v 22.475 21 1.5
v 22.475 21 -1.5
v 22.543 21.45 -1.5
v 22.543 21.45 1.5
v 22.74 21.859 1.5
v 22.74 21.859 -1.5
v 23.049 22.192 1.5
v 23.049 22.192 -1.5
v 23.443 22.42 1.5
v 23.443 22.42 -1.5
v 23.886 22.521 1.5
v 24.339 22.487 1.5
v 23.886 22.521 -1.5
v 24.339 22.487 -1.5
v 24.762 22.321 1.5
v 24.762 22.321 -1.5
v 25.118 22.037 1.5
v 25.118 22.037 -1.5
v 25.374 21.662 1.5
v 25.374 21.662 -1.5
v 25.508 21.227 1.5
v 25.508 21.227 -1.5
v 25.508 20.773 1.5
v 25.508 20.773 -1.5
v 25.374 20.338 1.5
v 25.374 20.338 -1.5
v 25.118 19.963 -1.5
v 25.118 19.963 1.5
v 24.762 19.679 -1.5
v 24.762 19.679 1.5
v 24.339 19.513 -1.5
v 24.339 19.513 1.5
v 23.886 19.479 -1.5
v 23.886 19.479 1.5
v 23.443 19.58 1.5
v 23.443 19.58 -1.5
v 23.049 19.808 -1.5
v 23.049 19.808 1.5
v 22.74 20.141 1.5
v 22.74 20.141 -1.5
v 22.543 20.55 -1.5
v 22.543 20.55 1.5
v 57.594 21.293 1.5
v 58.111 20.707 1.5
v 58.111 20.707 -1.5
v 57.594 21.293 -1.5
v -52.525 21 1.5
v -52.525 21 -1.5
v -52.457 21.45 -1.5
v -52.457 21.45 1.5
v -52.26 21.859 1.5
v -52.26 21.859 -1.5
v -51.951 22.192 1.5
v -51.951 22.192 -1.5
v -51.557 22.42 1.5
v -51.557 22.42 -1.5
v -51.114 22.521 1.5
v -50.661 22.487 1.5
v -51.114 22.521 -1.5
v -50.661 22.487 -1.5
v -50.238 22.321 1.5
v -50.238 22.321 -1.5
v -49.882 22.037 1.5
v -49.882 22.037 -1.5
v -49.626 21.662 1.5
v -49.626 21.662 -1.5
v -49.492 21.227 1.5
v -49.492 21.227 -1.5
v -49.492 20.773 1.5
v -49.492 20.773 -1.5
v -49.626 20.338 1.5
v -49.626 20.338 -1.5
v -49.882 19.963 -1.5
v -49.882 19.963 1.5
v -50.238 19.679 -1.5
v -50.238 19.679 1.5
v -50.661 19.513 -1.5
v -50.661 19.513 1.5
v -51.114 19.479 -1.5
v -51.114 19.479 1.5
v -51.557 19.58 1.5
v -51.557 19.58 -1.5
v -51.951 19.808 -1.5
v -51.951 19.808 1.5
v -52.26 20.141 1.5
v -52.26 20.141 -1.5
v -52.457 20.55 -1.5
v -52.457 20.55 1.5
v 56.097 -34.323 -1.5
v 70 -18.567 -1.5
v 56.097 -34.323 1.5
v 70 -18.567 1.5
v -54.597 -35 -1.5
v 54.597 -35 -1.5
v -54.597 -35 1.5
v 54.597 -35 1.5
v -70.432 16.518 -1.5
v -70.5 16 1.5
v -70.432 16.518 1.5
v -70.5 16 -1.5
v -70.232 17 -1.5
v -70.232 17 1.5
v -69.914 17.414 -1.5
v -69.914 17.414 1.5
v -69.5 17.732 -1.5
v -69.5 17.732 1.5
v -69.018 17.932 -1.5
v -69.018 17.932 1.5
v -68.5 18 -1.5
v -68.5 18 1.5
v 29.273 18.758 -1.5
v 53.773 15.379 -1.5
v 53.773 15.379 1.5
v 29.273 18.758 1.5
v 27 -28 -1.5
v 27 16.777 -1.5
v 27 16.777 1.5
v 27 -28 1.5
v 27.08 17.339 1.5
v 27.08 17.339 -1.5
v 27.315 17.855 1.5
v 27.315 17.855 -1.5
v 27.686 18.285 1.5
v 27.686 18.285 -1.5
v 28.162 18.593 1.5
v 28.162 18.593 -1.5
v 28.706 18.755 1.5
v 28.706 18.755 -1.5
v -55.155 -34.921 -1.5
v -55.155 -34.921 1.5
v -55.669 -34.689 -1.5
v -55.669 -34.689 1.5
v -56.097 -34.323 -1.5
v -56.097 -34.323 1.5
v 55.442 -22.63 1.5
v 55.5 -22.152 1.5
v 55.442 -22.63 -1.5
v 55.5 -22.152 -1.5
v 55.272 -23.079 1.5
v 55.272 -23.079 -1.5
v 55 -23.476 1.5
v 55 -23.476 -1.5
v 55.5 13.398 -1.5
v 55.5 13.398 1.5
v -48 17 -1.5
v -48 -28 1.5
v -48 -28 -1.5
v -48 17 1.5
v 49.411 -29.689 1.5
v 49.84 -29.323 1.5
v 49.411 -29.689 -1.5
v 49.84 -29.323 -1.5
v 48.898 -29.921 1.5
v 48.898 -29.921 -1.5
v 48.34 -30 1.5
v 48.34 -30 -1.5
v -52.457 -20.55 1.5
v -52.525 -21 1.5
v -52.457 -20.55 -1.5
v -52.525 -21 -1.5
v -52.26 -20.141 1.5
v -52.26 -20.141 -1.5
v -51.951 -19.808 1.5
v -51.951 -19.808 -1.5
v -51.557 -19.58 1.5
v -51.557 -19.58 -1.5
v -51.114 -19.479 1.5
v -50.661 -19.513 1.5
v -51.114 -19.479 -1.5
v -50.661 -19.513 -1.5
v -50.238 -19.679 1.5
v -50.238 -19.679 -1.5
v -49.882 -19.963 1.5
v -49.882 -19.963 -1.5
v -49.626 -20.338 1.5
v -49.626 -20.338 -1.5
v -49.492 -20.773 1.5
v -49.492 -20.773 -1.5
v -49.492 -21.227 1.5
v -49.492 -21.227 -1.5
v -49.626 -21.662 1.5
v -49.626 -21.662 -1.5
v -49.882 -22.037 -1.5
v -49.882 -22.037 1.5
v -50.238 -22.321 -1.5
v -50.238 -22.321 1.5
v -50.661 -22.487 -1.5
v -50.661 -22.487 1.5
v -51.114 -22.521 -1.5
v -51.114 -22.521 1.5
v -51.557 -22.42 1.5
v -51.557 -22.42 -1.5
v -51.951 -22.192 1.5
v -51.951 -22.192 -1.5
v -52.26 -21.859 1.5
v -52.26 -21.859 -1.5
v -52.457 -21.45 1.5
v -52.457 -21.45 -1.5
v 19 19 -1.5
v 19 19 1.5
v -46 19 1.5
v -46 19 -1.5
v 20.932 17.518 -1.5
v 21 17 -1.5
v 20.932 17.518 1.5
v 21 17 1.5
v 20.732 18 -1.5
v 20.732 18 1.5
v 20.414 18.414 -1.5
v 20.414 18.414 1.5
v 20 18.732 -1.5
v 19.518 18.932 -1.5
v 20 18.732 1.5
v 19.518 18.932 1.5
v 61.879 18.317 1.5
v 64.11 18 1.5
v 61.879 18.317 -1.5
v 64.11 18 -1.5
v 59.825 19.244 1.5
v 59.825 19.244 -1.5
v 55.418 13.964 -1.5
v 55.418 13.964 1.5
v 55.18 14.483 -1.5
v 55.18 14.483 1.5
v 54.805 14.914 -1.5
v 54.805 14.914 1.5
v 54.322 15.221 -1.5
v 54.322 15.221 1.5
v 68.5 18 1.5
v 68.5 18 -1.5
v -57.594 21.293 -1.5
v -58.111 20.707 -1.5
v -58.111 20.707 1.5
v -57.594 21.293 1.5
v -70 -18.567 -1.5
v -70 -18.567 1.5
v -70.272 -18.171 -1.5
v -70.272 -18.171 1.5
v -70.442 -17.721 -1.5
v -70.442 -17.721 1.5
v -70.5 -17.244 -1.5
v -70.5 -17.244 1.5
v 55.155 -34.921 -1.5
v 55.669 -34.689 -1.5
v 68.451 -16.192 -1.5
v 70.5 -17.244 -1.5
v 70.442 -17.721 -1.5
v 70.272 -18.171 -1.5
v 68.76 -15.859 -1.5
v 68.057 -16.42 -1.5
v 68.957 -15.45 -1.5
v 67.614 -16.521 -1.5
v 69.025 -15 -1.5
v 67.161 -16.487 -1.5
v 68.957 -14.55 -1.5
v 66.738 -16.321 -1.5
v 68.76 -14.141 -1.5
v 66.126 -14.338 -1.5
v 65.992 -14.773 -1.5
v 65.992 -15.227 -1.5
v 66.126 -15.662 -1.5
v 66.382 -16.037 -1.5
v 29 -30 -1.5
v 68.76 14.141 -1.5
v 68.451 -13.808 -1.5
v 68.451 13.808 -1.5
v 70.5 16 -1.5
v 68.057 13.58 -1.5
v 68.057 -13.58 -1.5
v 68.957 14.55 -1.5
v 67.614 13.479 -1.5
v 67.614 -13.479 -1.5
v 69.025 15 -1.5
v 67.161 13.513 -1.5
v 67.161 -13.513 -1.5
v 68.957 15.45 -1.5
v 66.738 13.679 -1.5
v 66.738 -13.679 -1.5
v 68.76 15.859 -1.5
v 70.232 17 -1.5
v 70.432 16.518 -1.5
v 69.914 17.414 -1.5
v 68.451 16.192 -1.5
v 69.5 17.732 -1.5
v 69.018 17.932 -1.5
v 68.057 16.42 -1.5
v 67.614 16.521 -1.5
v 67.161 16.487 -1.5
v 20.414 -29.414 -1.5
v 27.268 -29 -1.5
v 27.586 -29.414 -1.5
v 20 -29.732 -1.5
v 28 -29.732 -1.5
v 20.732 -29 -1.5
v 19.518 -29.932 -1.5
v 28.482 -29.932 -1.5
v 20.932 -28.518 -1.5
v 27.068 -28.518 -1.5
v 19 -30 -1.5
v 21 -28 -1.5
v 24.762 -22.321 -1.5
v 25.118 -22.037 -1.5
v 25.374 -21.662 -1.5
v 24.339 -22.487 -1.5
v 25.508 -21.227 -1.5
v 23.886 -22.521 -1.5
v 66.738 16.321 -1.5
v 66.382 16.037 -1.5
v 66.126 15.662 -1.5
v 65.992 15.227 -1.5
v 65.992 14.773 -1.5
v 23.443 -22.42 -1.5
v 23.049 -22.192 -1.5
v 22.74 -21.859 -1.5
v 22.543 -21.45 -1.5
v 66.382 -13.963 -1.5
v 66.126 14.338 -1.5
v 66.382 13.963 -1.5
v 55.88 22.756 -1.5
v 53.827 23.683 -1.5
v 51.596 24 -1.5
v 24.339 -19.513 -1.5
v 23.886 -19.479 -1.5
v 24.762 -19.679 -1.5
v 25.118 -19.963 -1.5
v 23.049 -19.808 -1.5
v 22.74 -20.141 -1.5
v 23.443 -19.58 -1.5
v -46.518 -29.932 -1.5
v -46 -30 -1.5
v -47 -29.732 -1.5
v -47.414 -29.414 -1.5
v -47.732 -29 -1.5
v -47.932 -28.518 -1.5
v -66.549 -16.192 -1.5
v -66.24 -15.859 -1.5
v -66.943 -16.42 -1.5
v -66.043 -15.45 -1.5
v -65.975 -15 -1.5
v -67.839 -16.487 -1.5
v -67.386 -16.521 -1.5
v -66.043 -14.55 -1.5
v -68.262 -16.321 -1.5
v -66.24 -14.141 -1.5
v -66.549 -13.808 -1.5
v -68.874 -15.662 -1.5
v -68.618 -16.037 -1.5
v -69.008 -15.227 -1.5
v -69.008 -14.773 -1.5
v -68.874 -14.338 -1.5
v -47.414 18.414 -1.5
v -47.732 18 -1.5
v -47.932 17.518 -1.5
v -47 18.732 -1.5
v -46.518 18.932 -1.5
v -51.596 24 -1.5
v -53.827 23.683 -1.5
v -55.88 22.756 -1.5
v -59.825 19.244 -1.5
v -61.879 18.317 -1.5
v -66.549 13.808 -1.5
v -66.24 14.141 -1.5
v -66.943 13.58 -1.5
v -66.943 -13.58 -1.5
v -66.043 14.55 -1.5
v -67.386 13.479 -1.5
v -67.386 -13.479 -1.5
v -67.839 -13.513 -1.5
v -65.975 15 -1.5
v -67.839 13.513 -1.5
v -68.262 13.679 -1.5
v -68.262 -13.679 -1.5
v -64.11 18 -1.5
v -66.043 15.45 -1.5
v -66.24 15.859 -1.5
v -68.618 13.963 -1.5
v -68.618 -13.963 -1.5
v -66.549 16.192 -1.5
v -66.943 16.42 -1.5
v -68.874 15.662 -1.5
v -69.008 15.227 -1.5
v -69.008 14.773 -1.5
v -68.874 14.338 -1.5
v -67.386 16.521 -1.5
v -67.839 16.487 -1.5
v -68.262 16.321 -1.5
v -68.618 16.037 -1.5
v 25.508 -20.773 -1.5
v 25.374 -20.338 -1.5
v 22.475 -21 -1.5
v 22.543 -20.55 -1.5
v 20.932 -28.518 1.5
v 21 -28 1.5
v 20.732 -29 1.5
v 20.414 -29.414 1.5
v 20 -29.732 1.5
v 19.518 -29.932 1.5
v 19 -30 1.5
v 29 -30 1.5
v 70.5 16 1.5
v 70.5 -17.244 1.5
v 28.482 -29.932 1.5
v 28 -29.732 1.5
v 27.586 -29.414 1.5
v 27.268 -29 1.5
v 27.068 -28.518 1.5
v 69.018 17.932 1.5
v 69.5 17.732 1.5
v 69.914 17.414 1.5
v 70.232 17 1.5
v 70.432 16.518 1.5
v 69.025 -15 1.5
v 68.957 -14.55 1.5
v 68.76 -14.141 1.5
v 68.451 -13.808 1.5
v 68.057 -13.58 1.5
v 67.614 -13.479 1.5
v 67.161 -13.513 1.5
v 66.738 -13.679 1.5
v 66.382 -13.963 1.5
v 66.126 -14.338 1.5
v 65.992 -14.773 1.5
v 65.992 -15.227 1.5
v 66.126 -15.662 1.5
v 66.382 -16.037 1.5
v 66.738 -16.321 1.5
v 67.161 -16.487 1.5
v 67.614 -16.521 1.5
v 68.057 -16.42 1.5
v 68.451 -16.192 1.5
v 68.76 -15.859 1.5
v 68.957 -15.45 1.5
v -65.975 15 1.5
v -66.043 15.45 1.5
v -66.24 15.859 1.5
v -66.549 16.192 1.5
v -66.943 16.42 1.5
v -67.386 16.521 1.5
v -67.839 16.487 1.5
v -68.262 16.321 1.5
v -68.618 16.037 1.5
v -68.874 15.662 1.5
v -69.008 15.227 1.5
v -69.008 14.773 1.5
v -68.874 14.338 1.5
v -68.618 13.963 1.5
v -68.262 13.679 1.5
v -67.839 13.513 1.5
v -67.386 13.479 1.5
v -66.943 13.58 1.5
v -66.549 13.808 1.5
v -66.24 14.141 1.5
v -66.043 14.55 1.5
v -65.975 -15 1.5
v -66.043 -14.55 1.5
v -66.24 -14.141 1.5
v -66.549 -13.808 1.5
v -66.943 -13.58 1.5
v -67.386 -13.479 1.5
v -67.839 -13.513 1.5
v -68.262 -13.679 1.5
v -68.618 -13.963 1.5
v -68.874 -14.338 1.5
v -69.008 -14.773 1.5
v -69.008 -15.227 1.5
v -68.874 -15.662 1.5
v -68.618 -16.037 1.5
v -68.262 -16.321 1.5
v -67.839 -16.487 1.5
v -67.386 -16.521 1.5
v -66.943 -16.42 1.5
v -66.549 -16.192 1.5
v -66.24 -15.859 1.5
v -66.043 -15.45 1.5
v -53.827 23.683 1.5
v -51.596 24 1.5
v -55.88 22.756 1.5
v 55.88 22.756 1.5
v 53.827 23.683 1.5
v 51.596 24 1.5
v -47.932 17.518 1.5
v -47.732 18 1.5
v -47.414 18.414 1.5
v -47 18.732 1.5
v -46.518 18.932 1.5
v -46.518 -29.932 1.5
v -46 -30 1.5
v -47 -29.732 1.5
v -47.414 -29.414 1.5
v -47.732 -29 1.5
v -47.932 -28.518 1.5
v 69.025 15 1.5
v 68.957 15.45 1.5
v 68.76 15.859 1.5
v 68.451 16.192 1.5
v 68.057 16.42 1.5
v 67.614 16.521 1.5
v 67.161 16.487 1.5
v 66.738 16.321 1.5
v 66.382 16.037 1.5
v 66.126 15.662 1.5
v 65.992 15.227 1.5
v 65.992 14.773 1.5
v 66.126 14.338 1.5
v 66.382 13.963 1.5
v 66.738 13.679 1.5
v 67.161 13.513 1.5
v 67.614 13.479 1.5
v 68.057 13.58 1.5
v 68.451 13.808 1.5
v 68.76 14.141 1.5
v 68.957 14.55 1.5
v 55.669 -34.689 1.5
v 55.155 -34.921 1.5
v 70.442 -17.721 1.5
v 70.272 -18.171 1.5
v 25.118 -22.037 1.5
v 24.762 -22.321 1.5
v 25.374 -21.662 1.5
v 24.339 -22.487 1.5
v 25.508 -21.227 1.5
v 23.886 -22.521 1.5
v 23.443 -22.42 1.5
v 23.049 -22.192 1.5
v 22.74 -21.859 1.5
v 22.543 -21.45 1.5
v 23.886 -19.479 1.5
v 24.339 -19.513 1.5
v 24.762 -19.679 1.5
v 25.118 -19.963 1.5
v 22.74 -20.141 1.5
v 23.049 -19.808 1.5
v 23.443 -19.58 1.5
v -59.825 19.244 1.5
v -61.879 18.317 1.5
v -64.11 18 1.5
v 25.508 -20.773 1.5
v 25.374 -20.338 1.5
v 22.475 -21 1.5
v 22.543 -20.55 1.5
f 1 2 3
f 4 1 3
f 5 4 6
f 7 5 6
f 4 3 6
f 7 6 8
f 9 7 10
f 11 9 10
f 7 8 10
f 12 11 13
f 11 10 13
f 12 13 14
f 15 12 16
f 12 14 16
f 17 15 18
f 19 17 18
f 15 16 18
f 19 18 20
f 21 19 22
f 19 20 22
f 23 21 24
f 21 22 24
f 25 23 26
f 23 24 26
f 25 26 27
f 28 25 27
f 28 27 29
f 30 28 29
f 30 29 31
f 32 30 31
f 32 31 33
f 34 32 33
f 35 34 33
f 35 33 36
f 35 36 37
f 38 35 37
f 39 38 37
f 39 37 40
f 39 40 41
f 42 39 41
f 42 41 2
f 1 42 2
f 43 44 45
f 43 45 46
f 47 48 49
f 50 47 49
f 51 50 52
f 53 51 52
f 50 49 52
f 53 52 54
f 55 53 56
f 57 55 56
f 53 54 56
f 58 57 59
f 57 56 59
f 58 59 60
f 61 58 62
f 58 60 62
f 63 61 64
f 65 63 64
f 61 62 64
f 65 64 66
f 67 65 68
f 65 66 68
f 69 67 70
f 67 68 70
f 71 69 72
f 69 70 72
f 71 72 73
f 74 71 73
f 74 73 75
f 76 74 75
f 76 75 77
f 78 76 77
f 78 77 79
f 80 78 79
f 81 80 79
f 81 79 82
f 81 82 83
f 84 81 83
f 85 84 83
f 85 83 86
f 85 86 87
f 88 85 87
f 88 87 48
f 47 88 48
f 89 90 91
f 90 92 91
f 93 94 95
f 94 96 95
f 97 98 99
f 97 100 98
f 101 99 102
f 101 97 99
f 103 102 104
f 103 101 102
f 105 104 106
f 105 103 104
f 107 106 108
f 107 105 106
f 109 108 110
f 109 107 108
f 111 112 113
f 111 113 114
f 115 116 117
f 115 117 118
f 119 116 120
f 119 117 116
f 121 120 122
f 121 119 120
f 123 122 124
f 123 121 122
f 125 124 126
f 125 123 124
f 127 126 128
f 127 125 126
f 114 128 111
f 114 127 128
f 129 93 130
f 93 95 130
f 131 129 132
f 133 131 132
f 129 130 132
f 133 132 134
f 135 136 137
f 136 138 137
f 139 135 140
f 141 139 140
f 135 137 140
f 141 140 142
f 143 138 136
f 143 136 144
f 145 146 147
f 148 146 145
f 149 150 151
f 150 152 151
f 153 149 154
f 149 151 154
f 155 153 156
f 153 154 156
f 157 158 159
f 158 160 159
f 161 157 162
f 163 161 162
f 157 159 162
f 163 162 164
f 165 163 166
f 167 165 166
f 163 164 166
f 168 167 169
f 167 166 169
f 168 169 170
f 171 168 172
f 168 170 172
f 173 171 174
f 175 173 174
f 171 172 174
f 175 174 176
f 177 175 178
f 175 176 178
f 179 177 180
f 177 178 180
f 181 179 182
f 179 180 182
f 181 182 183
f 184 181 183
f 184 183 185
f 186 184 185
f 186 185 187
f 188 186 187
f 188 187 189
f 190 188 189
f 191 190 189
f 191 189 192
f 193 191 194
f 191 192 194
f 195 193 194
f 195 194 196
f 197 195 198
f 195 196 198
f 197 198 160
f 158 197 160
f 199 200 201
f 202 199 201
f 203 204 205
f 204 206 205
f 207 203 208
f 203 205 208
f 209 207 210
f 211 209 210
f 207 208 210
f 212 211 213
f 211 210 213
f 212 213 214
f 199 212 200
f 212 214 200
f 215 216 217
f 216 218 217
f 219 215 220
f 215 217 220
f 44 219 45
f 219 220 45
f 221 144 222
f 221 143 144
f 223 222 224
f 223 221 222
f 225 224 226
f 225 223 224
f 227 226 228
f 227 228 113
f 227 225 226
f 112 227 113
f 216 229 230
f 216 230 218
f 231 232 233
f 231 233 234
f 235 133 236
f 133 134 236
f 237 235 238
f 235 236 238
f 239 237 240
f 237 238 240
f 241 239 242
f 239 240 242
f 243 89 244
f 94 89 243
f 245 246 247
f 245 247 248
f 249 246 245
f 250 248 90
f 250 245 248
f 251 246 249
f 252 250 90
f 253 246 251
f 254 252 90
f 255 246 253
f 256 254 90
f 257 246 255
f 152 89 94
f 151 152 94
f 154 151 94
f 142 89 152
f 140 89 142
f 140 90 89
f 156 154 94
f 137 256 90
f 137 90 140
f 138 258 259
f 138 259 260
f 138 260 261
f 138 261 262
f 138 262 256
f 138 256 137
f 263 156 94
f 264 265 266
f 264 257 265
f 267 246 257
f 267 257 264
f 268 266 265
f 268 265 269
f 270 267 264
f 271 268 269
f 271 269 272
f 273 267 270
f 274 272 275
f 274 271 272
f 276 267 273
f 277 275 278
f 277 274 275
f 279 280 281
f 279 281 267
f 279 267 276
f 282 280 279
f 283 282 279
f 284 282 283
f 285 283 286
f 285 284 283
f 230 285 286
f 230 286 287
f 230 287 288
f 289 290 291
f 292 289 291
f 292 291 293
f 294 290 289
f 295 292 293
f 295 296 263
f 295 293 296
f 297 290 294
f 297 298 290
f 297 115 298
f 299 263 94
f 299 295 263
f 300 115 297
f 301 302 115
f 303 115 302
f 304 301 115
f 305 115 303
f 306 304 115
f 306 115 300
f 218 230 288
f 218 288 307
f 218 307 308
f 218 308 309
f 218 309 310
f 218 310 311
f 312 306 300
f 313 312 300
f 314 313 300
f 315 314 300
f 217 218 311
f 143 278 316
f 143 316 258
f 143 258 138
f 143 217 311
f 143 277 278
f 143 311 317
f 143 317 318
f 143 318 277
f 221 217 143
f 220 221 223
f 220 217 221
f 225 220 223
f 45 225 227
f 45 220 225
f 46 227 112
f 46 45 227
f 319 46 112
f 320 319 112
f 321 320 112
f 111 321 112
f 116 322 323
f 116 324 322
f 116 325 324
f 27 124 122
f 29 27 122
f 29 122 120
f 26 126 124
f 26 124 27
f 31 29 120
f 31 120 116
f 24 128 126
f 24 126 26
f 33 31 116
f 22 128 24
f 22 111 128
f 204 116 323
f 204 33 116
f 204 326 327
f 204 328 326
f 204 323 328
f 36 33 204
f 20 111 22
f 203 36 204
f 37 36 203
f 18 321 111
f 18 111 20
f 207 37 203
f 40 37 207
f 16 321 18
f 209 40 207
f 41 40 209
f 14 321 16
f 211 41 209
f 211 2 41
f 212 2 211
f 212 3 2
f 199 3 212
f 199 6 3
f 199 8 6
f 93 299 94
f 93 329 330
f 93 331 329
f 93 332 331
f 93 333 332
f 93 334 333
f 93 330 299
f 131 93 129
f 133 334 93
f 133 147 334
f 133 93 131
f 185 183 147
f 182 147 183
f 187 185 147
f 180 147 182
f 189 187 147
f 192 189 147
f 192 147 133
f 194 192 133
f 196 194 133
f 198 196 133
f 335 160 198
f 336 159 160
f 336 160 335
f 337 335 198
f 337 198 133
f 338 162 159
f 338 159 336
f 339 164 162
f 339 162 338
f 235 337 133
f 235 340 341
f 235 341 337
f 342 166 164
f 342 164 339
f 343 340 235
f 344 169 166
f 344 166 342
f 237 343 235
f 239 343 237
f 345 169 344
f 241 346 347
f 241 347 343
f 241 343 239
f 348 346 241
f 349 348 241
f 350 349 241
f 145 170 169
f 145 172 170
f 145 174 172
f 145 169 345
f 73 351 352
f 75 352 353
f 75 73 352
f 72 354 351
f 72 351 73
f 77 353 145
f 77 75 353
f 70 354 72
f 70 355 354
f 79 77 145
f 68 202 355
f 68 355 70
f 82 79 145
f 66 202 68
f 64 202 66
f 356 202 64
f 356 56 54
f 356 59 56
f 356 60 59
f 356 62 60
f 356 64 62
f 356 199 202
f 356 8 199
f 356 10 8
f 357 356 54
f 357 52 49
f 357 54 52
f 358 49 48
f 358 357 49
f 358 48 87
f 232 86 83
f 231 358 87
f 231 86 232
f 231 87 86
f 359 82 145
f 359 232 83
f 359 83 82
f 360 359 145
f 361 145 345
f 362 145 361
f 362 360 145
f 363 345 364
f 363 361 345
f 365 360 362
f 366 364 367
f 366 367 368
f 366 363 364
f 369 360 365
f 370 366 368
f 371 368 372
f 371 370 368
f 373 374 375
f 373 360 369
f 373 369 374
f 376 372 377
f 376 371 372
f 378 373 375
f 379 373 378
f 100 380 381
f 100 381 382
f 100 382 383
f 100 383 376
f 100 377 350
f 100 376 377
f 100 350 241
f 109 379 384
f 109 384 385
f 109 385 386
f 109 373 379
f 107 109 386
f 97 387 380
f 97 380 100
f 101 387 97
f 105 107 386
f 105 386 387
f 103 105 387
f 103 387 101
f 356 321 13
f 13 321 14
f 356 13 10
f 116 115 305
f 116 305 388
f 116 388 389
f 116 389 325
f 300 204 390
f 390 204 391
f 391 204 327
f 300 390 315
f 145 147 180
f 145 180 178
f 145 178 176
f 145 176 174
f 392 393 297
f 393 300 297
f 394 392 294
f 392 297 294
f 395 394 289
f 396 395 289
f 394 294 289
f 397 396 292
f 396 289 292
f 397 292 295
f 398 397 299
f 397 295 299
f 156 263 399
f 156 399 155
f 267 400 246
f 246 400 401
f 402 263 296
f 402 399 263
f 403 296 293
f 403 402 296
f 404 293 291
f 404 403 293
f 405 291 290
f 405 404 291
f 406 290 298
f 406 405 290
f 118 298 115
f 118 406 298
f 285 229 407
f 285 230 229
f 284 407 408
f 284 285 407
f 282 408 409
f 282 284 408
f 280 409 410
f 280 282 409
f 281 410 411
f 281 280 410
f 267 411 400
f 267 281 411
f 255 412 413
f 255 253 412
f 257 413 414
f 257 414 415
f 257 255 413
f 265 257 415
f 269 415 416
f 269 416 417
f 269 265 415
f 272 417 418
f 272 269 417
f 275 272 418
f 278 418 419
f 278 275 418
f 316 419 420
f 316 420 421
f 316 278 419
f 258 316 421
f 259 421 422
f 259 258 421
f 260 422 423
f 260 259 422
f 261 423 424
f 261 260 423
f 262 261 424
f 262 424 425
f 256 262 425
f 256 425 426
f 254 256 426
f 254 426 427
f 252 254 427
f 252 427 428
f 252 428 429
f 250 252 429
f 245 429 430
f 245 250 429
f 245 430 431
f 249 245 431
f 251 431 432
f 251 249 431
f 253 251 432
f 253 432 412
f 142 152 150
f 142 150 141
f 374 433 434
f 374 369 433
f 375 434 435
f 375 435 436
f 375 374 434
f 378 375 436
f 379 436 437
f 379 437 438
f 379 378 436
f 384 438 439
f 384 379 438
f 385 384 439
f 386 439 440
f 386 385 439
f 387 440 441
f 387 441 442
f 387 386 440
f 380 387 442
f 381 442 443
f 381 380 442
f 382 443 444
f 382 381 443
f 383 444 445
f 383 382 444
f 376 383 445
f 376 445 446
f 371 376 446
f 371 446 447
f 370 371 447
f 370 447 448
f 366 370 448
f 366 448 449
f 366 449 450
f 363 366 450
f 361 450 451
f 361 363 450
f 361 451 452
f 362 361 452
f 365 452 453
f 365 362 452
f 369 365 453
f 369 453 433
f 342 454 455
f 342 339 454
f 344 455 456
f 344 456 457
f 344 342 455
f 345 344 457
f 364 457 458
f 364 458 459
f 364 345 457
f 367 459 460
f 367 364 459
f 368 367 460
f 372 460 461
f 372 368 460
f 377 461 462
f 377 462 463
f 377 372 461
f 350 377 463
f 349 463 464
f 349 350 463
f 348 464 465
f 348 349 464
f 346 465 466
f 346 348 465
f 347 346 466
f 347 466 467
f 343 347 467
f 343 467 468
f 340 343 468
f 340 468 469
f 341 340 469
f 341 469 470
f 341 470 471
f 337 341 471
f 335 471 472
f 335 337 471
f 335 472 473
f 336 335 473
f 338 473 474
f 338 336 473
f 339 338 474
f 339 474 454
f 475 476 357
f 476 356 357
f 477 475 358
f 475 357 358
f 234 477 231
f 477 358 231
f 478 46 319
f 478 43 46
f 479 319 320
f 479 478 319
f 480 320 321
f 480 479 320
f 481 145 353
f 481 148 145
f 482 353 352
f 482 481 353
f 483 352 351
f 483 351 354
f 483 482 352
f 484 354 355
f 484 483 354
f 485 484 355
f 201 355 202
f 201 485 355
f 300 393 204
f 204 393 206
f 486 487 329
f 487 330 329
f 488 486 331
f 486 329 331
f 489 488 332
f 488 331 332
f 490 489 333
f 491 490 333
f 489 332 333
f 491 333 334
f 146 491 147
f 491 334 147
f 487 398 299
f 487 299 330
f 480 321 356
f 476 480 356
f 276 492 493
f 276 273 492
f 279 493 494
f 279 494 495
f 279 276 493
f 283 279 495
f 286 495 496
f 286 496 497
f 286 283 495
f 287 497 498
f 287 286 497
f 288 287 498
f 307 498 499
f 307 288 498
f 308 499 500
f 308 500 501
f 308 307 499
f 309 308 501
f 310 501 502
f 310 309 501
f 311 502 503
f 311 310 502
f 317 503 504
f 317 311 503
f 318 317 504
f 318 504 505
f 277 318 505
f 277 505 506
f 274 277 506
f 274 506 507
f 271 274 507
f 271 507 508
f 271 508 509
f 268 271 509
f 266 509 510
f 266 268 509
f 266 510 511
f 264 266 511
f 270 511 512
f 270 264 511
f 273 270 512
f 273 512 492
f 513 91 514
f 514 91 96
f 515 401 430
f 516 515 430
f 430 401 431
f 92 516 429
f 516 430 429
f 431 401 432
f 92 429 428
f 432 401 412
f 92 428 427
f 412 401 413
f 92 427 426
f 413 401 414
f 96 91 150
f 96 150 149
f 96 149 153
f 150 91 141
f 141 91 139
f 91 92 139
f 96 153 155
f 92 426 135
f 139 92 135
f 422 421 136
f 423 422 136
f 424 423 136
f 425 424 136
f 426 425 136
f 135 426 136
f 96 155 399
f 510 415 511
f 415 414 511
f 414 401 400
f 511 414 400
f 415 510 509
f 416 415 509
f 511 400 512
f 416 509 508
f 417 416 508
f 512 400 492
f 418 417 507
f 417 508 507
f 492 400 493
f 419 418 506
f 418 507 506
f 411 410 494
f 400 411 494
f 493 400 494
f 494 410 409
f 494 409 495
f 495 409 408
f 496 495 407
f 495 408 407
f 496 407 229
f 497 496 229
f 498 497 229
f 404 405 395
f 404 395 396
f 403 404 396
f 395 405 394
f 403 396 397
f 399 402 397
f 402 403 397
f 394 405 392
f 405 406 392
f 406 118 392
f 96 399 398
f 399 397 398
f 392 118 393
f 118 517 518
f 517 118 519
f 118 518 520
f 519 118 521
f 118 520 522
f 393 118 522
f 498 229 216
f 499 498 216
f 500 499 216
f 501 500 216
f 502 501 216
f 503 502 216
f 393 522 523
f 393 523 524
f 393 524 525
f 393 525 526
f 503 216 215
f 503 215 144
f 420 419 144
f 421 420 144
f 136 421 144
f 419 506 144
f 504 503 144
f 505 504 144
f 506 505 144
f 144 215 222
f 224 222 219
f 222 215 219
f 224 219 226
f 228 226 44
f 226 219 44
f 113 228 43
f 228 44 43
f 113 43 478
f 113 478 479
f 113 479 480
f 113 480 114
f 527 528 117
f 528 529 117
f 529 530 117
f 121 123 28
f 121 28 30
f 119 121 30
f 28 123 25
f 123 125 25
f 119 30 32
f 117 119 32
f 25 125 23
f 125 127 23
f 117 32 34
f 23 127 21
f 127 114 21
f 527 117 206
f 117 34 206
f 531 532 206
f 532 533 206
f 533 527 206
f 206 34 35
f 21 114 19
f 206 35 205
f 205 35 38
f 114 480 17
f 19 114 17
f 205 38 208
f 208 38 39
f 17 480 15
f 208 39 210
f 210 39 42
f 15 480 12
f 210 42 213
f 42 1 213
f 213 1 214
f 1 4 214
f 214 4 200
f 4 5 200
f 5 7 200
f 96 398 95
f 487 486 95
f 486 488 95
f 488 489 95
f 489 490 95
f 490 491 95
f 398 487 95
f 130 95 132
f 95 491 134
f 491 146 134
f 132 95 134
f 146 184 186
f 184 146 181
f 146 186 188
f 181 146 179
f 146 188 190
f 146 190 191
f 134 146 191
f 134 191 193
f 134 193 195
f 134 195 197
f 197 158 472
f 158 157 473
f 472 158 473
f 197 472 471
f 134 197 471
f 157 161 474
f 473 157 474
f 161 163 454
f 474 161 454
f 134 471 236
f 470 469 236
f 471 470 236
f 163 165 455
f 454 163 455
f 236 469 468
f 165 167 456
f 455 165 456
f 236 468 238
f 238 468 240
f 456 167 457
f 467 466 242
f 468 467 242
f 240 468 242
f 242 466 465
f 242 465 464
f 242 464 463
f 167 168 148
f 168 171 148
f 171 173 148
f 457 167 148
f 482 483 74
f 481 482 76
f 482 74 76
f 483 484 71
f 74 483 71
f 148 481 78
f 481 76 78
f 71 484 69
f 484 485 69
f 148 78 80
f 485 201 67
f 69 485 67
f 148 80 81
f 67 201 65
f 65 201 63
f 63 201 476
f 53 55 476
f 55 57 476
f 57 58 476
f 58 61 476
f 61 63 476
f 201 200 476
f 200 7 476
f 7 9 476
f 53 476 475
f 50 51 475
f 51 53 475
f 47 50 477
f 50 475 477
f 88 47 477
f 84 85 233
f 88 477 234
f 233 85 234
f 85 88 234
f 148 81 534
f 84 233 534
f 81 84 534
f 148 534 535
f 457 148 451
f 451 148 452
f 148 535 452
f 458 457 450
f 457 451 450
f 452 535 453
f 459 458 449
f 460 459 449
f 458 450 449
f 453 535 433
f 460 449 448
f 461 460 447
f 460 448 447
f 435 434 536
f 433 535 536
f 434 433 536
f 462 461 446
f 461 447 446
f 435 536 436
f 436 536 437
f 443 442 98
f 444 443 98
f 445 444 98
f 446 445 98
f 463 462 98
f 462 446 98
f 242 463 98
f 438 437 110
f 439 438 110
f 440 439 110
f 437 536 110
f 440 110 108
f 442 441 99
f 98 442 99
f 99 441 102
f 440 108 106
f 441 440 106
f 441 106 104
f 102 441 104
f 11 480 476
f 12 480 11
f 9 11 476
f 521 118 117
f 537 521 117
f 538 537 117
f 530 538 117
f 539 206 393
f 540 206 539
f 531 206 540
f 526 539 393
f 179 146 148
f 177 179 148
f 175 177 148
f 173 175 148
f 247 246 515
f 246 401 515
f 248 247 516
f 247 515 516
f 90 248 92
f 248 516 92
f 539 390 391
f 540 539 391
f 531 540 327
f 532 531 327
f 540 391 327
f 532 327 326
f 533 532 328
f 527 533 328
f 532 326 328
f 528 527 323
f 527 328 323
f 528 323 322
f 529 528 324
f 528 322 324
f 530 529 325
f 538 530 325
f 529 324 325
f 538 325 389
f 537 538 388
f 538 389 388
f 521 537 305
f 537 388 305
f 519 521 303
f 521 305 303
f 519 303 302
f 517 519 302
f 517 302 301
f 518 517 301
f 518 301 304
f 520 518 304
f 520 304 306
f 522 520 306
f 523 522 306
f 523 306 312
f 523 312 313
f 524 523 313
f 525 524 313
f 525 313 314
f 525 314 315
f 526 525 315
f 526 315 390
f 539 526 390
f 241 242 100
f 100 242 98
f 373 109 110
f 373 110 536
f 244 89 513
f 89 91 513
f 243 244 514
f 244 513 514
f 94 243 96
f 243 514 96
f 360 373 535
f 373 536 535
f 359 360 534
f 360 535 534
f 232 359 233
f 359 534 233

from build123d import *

# Parameters (mm, degrees)
SKETCH_1_R          = 1.525
EXTRUDE_1_DEPTH     = 1.5
SKETCH_2_R          = 1.525
CUT_EXTRUDE_1_DEPTH = 21
CUT_EXTRUDE_2_DEPTH = 11
CUT_EXTRUDE_3_DEPTH = 11
FILLET_1_R          = 8
SKETCH_5_W          = 69
SKETCH_5_H          = 49
CUT_EXTRUDE_4_DEPTH = 11
FILLET_2_R          = 2
FILLET_3_R          = 2


with BuildPart() as part:
    # 草图1 → 凸台-拉伸1 (new, symmetric)
    with BuildSketch(Plane.XY):
        Polygon((-70.5, -18), (-70.5, 18), (-55.5, 35), (55.5, 35), (70.5, 18), (70.5, -18), (55.5, -35), (-55.5, -35), align=None)
        with Locations((67.5, -15)):
            Circle(SKETCH_1_R, mode=Mode.SUBTRACT)
        with Locations((-67.5, -15)):
            Circle(SKETCH_1_R, mode=Mode.SUBTRACT)
        with Locations((-67.5, 15)):
            Circle(SKETCH_1_R, mode=Mode.SUBTRACT)
        with Locations((67.5, 15)):
            Circle(SKETCH_1_R, mode=Mode.SUBTRACT)
    extrude(amount=EXTRUDE_1_DEPTH, both=True)

    # 草图2 → 切除-拉伸1 (cut, symmetric)
    with BuildSketch(Plane(origin=(0, 0, -1.5), x_dir=(-1, 0, 0), z_dir=(0, 0, -1))):
        with Locations((-24, 21)):
            Circle(SKETCH_2_R)
        with Locations((-24, -21)):
            Circle(SKETCH_2_R)
        with Locations((51, 21)):
            Circle(SKETCH_2_R)
        with Locations((51, -21)):
            Circle(SKETCH_2_R)
    extrude(amount=CUT_EXTRUDE_1_DEPTH, both=True, mode=Mode.SUBTRACT)

    # 草图3 → 切除-拉伸2 (cut, symmetric)
    with BuildSketch(Plane(origin=(0, 0, -1.5), x_dir=(-1, 0, 0), z_dir=(0, 0, -1))):
        Polygon((-70.5, 18), (-60.5, 18), (-45.5, 35), (-55.5, 35), align=None)
        Polygon((55.5, 35), (70.5, 18), (60.5, 18), (45.5, 35), align=None)
    extrude(amount=CUT_EXTRUDE_2_DEPTH, both=True, mode=Mode.SUBTRACT)

    # 草图4 → 切除-拉伸3 (cut, symmetric)
    with BuildSketch(Plane(origin=(0, 0, -1.5), x_dir=(-1, 0, 0), z_dir=(0, 0, -1))):
        Polygon((-55.205882353, 24), (55.205882353, 24), (45.5, 35), (-45.5, 35), align=None)
    extrude(amount=CUT_EXTRUDE_3_DEPTH, both=True, mode=Mode.SUBTRACT)

    # 圆角1
    fillet_1_edges = [part.edges().sort_by_distance(p)[0] for p in [
        (55.205882353, 24, 0),
        (-55.205882353, 24, 0),
        (60.5, 18, 0),
        (-60.5, 18, 0),
    ]]
    fillet(fillet_1_edges, radius=FILLET_1_R)

    # 草图5 → 切除-拉伸4 (cut, symmetric)
    with BuildSketch(Plane(origin=(0, 0, -1.5), x_dir=(-1, 0, 0), z_dir=(0, 0, -1))):
        with Locations((13.5, -5.5)):
            Rectangle(SKETCH_5_W, SKETCH_5_H)
        Polygon((-55.5, 15.140970914), (-27, 19.072005396), (-27, -30), (-49.242791484, -30), (-55.5, -22.908497015), align=None)
    extrude(amount=CUT_EXTRUDE_4_DEPTH, both=True, mode=Mode.SUBTRACT)

    # 圆角2
    fillet_2_edges = [part.edges().sort_by_distance(p)[0] for p in [
        (-48, 19, 0),
        (-48, -30, 0),
        (21, -30, 0),
        (21, 19, 0),
        (55.5, -22.908497015, 0),
        (55.5, 15.140970914, 0),
        (27, 19.072005396, 0),
        (27, -30, 0),
        (49.242791484, -30, 0),
    ]]
    fillet(fillet_2_edges, radius=FILLET_2_R)

    # 圆角3
    fillet_3_edges = [part.edges().sort_by_distance(p)[0] for p in [
        (70.5, 18, 0),
        (70.5, -18, 0),
        (55.5, -35, 0),
        (-55.5, -35, 0),
        (-70.5, -18, 0),
        (-70.5, 18, 0),
    ]]
    fillet(fillet_3_edges, radius=FILLET_3_R)


solid = part.part
